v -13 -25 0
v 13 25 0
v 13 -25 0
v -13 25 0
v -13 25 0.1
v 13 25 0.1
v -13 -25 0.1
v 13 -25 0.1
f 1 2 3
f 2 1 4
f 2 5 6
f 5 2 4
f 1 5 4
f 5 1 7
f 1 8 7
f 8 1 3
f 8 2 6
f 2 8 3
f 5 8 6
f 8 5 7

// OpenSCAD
// file: ../p/4-4edge.scad
use <../lib.scad>
$fa=1; $fs=0.2;
function ldraw_lib__4_4edge(realsolid=false) = [
// 0 Circle 1.0
// 0 Name: 4-4edge.dat
// 0 Author: James Jessiman
// 0 !LDRAW_ORG Primitive UPDATE 2017-01
// 0 !LICENSE Licensed under CC BY 2.0 and CC BY 4.0 : see CAreadme.txt
// 
// 0 BFC CERTIFY CCW
  [0,"BFC","CERTIFY"],
  [0,"BFC","CCW"],
// 
// 0 !HISTORY 1998-12-15 [PTadmin] Official Update 1998-10
// 0 !HISTORY 2005-12-28 [PTadmin] Official Update 2005-01
// 0 !HISTORY 2007-06-24 [PTadmin] Header formatted for Contributor Agreement
// 0 !HISTORY 2008-07-01 [PTadmin] Official Update 2008-01
// 0 !HISTORY 2017-01-15 [Steffen] BFCed
// 0 !HISTORY 2017-12-30 [PTadmin] Official Update 2017-01
// 
// 
// 2 24 1 0 0 0.9239 0 0.3827
  [2,24,1,0,0,0.9239,0,0.3827],
// 2 24 0.9239 0 0.3827 0.7071 0 0.7071
  [2,24,0.9239,0,0.3827,0.7071,0,0.7071],
// 2 24 0.7071 0 0.7071 0.3827 0 0.9239
  [2,24,0.7071,0,0.7071,0.3827,0,0.9239],
// 2 24 0.3827 0 0.9239 0 0 1
  [2,24,0.3827,0,0.9239,0,0,1],
// 2 24 0 0 1 -0.3827 0 0.9239
  [2,24,0,0,1,-0.3827,0,0.9239],
// 2 24 -0.3827 0 0.9239 -0.7071 0 0.7071
  [2,24,-0.3827,0,0.9239,-0.7071,0,0.7071],
// 2 24 -0.7071 0 0.7071 -0.9239 0 0.3827
  [2,24,-0.7071,0,0.7071,-0.9239,0,0.3827],
// 2 24 -0.9239 0 0.3827 -1 0 -0
  [2,24,-0.9239,0,0.3827,-1,0,-0],
// 2 24 -1 0 -0 -0.9239 0 -0.3827
  [2,24,-1,0,-0,-0.9239,0,-0.3827],
// 2 24 -0.9239 0 -0.3827 -0.7071 0 -0.7071
  [2,24,-0.9239,0,-0.3827,-0.7071,0,-0.7071],
// 2 24 -0.7071 0 -0.7071 -0.3827 0 -0.9239
  [2,24,-0.7071,0,-0.7071,-0.3827,0,-0.9239],
// 2 24 -0.3827 0 -0.9239 0 0 -1
  [2,24,-0.3827,0,-0.9239,0,0,-1],
// 2 24 0 0 -1 0.3827 0 -0.9239
  [2,24,0,0,-1,0.3827,0,-0.9239],
// 2 24 0.3827 0 -0.9239 0.7071 0 -0.7071
  [2,24,0.3827,0,-0.9239,0.7071,0,-0.7071],
// 2 24 0.7071 0 -0.7071 0.9239 0 -0.3827
  [2,24,0.7071,0,-0.7071,0.9239,0,-0.3827],
// 2 24 0.9239 0 -0.3827 1 0 0
  [2,24,0.9239,0,-0.3827,1,0,0],
];
module ldraw_lib__4_4edge(step=0, col=false, unit=2/5, alt=false, line=0.2, solid=!$preview)
    makepoly(ldraw_lib__4_4edge(solid), step=step, col=col, unit=unit, alt=alt, line=line, solid=solid);
ldraw_lib__4_4edge(line=0.2);
// file: ../p/4-4disc.scad
use <../lib.scad>
$fa=1; $fs=0.2;
function ldraw_lib__4_4disc(realsolid=false) = [
// 0 Disc 1.0
// 0 Name: 4-4disc.dat
// 0 Author: James Jessiman
// 0 !LDRAW_ORG Primitive UPDATE 2002-02
// 0 !LICENSE Licensed under CC BY 2.0 and CC BY 4.0 : see CAreadme.txt
// 
// 0 BFC CERTIFY CCW
  [0,"BFC","CERTIFY"],
  [0,"BFC","CCW"],
// 
// 0 !HISTORY 1998-12-15 [PTadmin] Official Update 1998-10
// 0 !HISTORY 2002-03-23 [sbliss] Added BFC statement
// 0 !HISTORY 2002-04-25 [PTadmin] Official Update 2002-02
// 0 !HISTORY 2007-06-24 [PTadmin] Header formatted for Contributor Agreement
// 0 !HISTORY 2008-07-01 [PTadmin] Official Update 2008-01
// 
// 
// 3 16 0 0 0 1 0 0 0.9239 0 0.3827
  [3,16,0,0,0,1,0,0,0.9239,0,0.3827],
// 3 16 0 0 0 0.9239 0 0.3827 0.7071 0 0.7071
  [3,16,0,0,0,0.9239,0,0.3827,0.7071,0,0.7071],
// 3 16 0 0 0 0.7071 0 0.7071 0.3827 0 0.9239
  [3,16,0,0,0,0.7071,0,0.7071,0.3827,0,0.9239],
// 3 16 0 0 0 0.3827 0 0.9239 0 0 1
  [3,16,0,0,0,0.3827,0,0.9239,0,0,1],
// 3 16 0 0 0 0 0 1 -0.3827 0 0.9239
  [3,16,0,0,0,0,0,1,-0.3827,0,0.9239],
// 3 16 0 0 0 -0.3827 0 0.9239 -0.7071 0 0.7071
  [3,16,0,0,0,-0.3827,0,0.9239,-0.7071,0,0.7071],
// 3 16 0 0 0 -0.7071 0 0.7071 -0.9239 0 0.3827
  [3,16,0,0,0,-0.7071,0,0.7071,-0.9239,0,0.3827],
// 3 16 0 0 0 -0.9239 0 0.3827 -1 0 -0
  [3,16,0,0,0,-0.9239,0,0.3827,-1,0,-0],
// 3 16 0 0 0 -1 0 -0 -0.9239 0 -0.3827
  [3,16,0,0,0,-1,0,-0,-0.9239,0,-0.3827],
// 3 16 0 0 0 -0.9239 0 -0.3827 -0.7071 0 -0.7071
  [3,16,0,0,0,-0.9239,0,-0.3827,-0.7071,0,-0.7071],
// 3 16 0 0 0 -0.7071 0 -0.7071 -0.3827 0 -0.9239
  [3,16,0,0,0,-0.7071,0,-0.7071,-0.3827,0,-0.9239],
// 3 16 0 0 0 -0.3827 0 -0.9239 0 0 -1
  [3,16,0,0,0,-0.3827,0,-0.9239,0,0,-1],
// 3 16 0 0 0 0 0 -1 0.3827 0 -0.9239
  [3,16,0,0,0,0,0,-1,0.3827,0,-0.9239],
// 3 16 0 0 0 0.3827 0 -0.9239 0.7071 0 -0.7071
  [3,16,0,0,0,0.3827,0,-0.9239,0.7071,0,-0.7071],
// 3 16 0 0 0 0.7071 0 -0.7071 0.9239 0 -0.3827
  [3,16,0,0,0,0.7071,0,-0.7071,0.9239,0,-0.3827],
// 3 16 0 0 0 0.9239 0 -0.3827 1 0 0
  [3,16,0,0,0,0.9239,0,-0.3827,1,0,0],
// 0
];
module ldraw_lib__4_4disc(step=0, col=false, unit=2/5, alt=false, line=0.2, solid=!$preview)
    makepoly(ldraw_lib__4_4disc(solid), step=step, col=col, unit=unit, alt=alt, line=line, solid=solid);
ldraw_lib__4_4disc(line=0.2);
// file: ../p/4-4cyli.scad
use <../lib.scad>
$fa=1; $fs=0.2;
function ldraw_lib__4_4cyli(realsolid=false) = [
// 0 Cylinder 1.0
// 0 Name: 4-4cyli.dat
// 0 Author: James Jessiman
// 0 !LDRAW_ORG Primitive UPDATE 2005-01
// 0 !LICENSE Licensed under CC BY 2.0 and CC BY 4.0 : see CAreadme.txt
// 
// 0 BFC CERTIFY CCW
  [0,"BFC","CERTIFY"],
  [0,"BFC","CCW"],
// 
// 0 !HISTORY 1998-12-15 [PTadmin] Official Update 1998-10
// 0 !HISTORY 2002-03-23 [sbliss] Added BFC statement; merged headers from files in distributions LDraw 0.27 and Complete.
// 0 !HISTORY 2002-04-25 [PTadmin] Official Update 2002-02
// 0 !HISTORY 2004-12-14 [guyvivan] BFC CCW
// 0 !HISTORY 2005-12-28 [PTadmin] Official Update 2005-01
// 0 !HISTORY 2007-06-24 [PTadmin] Header formatted for Contributor Agreement
// 0 !HISTORY 2008-07-01 [PTadmin] Official Update 2008-01
// 
// 
// 4 16 1 1 0 0.9239 1 0.3827 0.9239 0 0.3827 1 0 0
  [4,16,1,1,0,0.9239,1,0.3827,0.9239,0,0.3827,1,0,0],
// 5 24 1 0 0 1 1 0 0.9239 0 0.3827 0.9239 0 -0.3827
  [5,24,1,0,0,1,1,0,0.9239,0,0.3827,0.9239,0,-0.3827],
// 4 16 0.9239 1 0.3827 0.7071 1 0.7071 0.7071 0 0.7071 0.9239 0 0.3827
  [4,16,0.9239,1,0.3827,0.7071,1,0.7071,0.7071,0,0.7071,0.9239,0,0.3827],
// 5 24 0.9239 0 0.3827 0.9239 1 0.3827 0.7071 0 0.7071 1 0 0
  [5,24,0.9239,0,0.3827,0.9239,1,0.3827,0.7071,0,0.7071,1,0,0],
// 4 16 0.7071 1 0.7071 0.3827 1 0.9239 0.3827 0 0.9239 0.7071 0 0.7071
  [4,16,0.7071,1,0.7071,0.3827,1,0.9239,0.3827,0,0.9239,0.7071,0,0.7071],
// 5 24 0.7071 0 0.7071 0.7071 1 0.7071 0.3827 0 0.9239 0.9239 0 0.3827
  [5,24,0.7071,0,0.7071,0.7071,1,0.7071,0.3827,0,0.9239,0.9239,0,0.3827],
// 4 16 0.3827 1 0.9239 0 1 1 0 0 1 0.3827 0 0.9239
  [4,16,0.3827,1,0.9239,0,1,1,0,0,1,0.3827,0,0.9239],
// 5 24 0.3827 0 0.9239 0.3827 1 0.9239 0 0 1 0.7071 0 0.7071
  [5,24,0.3827,0,0.9239,0.3827,1,0.9239,0,0,1,0.7071,0,0.7071],
// 4 16 0 1 1 -0.3827 1 0.9239 -0.3827 0 0.9239 0 0 1
  [4,16,0,1,1,-0.3827,1,0.9239,-0.3827,0,0.9239,0,0,1],
// 5 24 0 0 1 0 1 1 -0.3827 0 0.9239 0.3827 0 0.9239
  [5,24,0,0,1,0,1,1,-0.3827,0,0.9239,0.3827,0,0.9239],
// 4 16 -0.3827 1 0.9239 -0.7071 1 0.7071 -0.7071 0 0.7071 -0.3827 0 0.9239
  [4,16,-0.3827,1,0.9239,-0.7071,1,0.7071,-0.7071,0,0.7071,-0.3827,0,0.9239],
// 5 24 -0.3827 0 0.9239 -0.3827 1 0.9239 -0.7071 0 0.7071 0 0 1
  [5,24,-0.3827,0,0.9239,-0.3827,1,0.9239,-0.7071,0,0.7071,0,0,1],
// 4 16 -0.7071 1 0.7071 -0.9239 1 0.3827 -0.9239 0 0.3827 -0.7071 0 0.7071
  [4,16,-0.7071,1,0.7071,-0.9239,1,0.3827,-0.9239,0,0.3827,-0.7071,0,0.7071],
// 5 24 -0.7071 0 0.7071 -0.7071 1 0.7071 -0.9239 0 0.3827 -0.3827 0 0.9239
  [5,24,-0.7071,0,0.7071,-0.7071,1,0.7071,-0.9239,0,0.3827,-0.3827,0,0.9239],
// 4 16 -0.9239 1 0.3827 -1 1 0 -1 0 0 -0.9239 0 0.3827
  [4,16,-0.9239,1,0.3827,-1,1,0,-1,0,0,-0.9239,0,0.3827],
// 5 24 -0.9239 0 0.3827 -0.9239 1 0.3827 -1 0 0 -0.7071 0 0.7071
  [5,24,-0.9239,0,0.3827,-0.9239,1,0.3827,-1,0,0,-0.7071,0,0.7071],
// 4 16 -1 1 0 -0.9239 1 -0.3827 -0.9239 0 -0.3827 -1 0 0
  [4,16,-1,1,0,-0.9239,1,-0.3827,-0.9239,0,-0.3827,-1,0,0],
// 5 24 -1 0 0 -1 1 0 -0.9239 0 -0.3827 -0.9239 0 0.3827
  [5,24,-1,0,0,-1,1,0,-0.9239,0,-0.3827,-0.9239,0,0.3827],
// 4 16 -0.9239 1 -0.3827 -0.7071 1 -0.7071 -0.7071 0 -0.7071 -0.9239 0 -0.3827
  [4,16,-0.9239,1,-0.3827,-0.7071,1,-0.7071,-0.7071,0,-0.7071,-0.9239,0,-0.3827],
// 5 24 -0.9239 0 -0.3827 -0.9239 1 -0.3827 -0.7071 0 -0.7071 -1 0 0
  [5,24,-0.9239,0,-0.3827,-0.9239,1,-0.3827,-0.7071,0,-0.7071,-1,0,0],
// 4 16 -0.7071 1 -0.7071 -0.3827 1 -0.9239 -0.3827 0 -0.9239 -0.7071 0 -0.7071
  [4,16,-0.7071,1,-0.7071,-0.3827,1,-0.9239,-0.3827,0,-0.9239,-0.7071,0,-0.7071],
// 5 24 -0.7071 0 -0.7071 -0.7071 1 -0.7071 -0.3827 0 -0.9239 -0.9239 0 -0.3827
  [5,24,-0.7071,0,-0.7071,-0.7071,1,-0.7071,-0.3827,0,-0.9239,-0.9239,0,-0.3827],
// 4 16 -0.3827 1 -0.9239 0 1 -1 0 0 -1 -0.3827 0 -0.9239
  [4,16,-0.3827,1,-0.9239,0,1,-1,0,0,-1,-0.3827,0,-0.9239],
// 5 24 -0.3827 0 -0.9239 -0.3827 1 -0.9239 0 0 -1 -0.7071 0 -0.7071
  [5,24,-0.3827,0,-0.9239,-0.3827,1,-0.9239,0,0,-1,-0.7071,0,-0.7071],
// 4 16 0 1 -1 0.3827 1 -0.9239 0.3827 0 -0.9239 0 0 -1
  [4,16,0,1,-1,0.3827,1,-0.9239,0.3827,0,-0.9239,0,0,-1],
// 5 24 0 0 -1 0 1 -1 0.3827 0 -0.9239 -0.3827 0 -0.9239
  [5,24,0,0,-1,0,1,-1,0.3827,0,-0.9239,-0.3827,0,-0.9239],
// 4 16 0.3827 1 -0.9239 0.7071 1 -0.7071 0.7071 0 -0.7071 0.3827 0 -0.9239
  [4,16,0.3827,1,-0.9239,0.7071,1,-0.7071,0.7071,0,-0.7071,0.3827,0,-0.9239],
// 5 24 0.3827 0 -0.9239 0.3827 1 -0.9239 0.7071 0 -0.7071 0 0 -1
  [5,24,0.3827,0,-0.9239,0.3827,1,-0.9239,0.7071,0,-0.7071,0,0,-1],
// 4 16 0.7071 1 -0.7071 0.9239 1 -0.3827 0.9239 0 -0.3827 0.7071 0 -0.7071
  [4,16,0.7071,1,-0.7071,0.9239,1,-0.3827,0.9239,0,-0.3827,0.7071,0,-0.7071],
// 5 24 0.7071 0 -0.7071 0.7071 1 -0.7071 0.9239 0 -0.3827 0.3827 0 -0.9239
  [5,24,0.7071,0,-0.7071,0.7071,1,-0.7071,0.9239,0,-0.3827,0.3827,0,-0.9239],
// 4 16 0.9239 1 -0.3827 1 1 0 1 0 0 0.9239 0 -0.3827
  [4,16,0.9239,1,-0.3827,1,1,0,1,0,0,0.9239,0,-0.3827],
// 5 24 0.9239 0 -0.3827 0.9239 1 -0.3827 1 0 0 0.7071 0 -0.7071
  [5,24,0.9239,0,-0.3827,0.9239,1,-0.3827,1,0,0,0.7071,0,-0.7071],
// 0
];
module ldraw_lib__4_4cyli(step=0, col=false, unit=2/5, alt=false, line=0.2, solid=!$preview)
    makepoly(ldraw_lib__4_4cyli(solid), step=step, col=col, unit=unit, alt=alt, line=line, solid=solid);
ldraw_lib__4_4cyli(line=0.2);
// file: ../p/stud3.scad
use <../lib.scad>
use <4-4cyli.scad>
use <4-4disc.scad>
use <4-4edge.scad>
$fa=1; $fs=0.2;
function ldraw_lib__stud3(realsolid=false) = realsolid ? 
    [openscad(translate([0,0,-eps()], o=cylinder(4+eps(), r=4)),2)] : [
// 0 Stud Tube Solid
// 0 Name: stud3.dat
// 0 Author: James Jessiman
// 0 !LDRAW_ORG Primitive UPDATE 2012-01
// 0 !LICENSE Licensed under CC BY 2.0 and CC BY 4.0 : see CAreadme.txt
// 
// 0 BFC CERTIFY CCW
  [0,"BFC","CERTIFY"],
  [0,"BFC","CCW"],
// 
// 0 !HISTORY 2002-04-04 [sbliss] Modified for BFC compliance
// 0 !HISTORY 2002-04-25 [PTadmin] Official Update 2002-02
// 0 !HISTORY 2007-06-24 [PTadmin] Header formatted for Contributor Agreement
// 0 !HISTORY 2008-07-01 [PTadmin] Official Update 2008-01
// 0 !HISTORY 2012-02-16 [Philo] Changed to CCW
// 0 !HISTORY 2012-03-30 [PTadmin] Official Update 2012-01
// 
// 
// 1 16 0 -4 0 4 0 0 0 1 0 0 0 4 4-4edge.dat
  [1,16,0,-4,0,4,0,0,0,1,0,0,0,4, ldraw_lib__4_4edge(realsolid)],
// 1 16 0 0 0 4 0 0 0 1 0 0 0 4 4-4edge.dat
  [1,16,0,0,0,4,0,0,0,1,0,0,0,4, ldraw_lib__4_4edge(realsolid)],
// 1 16 0 -4 0 4 0 0 0 1 0 0 0 4 4-4disc.dat
  [1,16,0,-4,0,4,0,0,0,1,0,0,0,4, ldraw_lib__4_4disc(realsolid)],
// 1 16 0 -4 0 4 0 0 0 4 0 0 0 4 4-4cyli.dat
  [1,16,0,-4,0,4,0,0,0,4,0,0,0,4, ldraw_lib__4_4cyli(realsolid)],
];
module ldraw_lib__stud3(step=0, col=false, unit=2/5, alt=false, line=0.2, solid=!$preview)
    makepoly(ldraw_lib__stud3(solid), step=step, col=col, unit=unit, alt=alt, line=line, solid=solid);
ldraw_lib__stud3(line=0.2);
// file: ../p/stud.scad
use <../lib.scad>
use <4-4cyli.scad>
use <4-4disc.scad>
use <4-4edge.scad>
$fa=1; $fs=0.2;
function ldraw_lib__stud(realsolid=false) = realsolid ? 
    [openscad(translate([0,0,-eps()], o=cylinder(4+eps(), r=6)),2)] : [
// 0 Stud
// 0 Name: stud.dat
// 0 Author: James Jessiman
// 0 !LDRAW_ORG Primitive UPDATE 2012-01
// 0 !LICENSE Licensed under CC BY 2.0 and CC BY 4.0 : see CAreadme.txt
// 
// 0 BFC CERTIFY CCW
  [0,"BFC","CERTIFY"],
  [0,"BFC","CCW"],
// 
// 0 !HISTORY 2002-04-04 [sbliss] Modified for BFC compliance
// 0 !HISTORY 2002-04-25 [PTadmin] Official Update 2002-02
// 0 !HISTORY 2007-06-24 [PTadmin] Header formatted for Contributor Agreement
// 0 !HISTORY 2008-07-01 [PTadmin] Official Update 2008-01
// 0 !HISTORY 2012-02-16 [Philo] Changed to CCW
// 0 !HISTORY 2012-03-30 [PTadmin] Official Update 2012-01
// 
// 
// 1 16 0 0 0 6 0 0 0 1 0 0 0 6 4-4edge.dat
  [1,16,0,0,0,6,0,0,0,1,0,0,0,6, ldraw_lib__4_4edge(realsolid)],
// 1 16 0 -4 0 6 0 0 0 1 0 0 0 6 4-4edge.dat
  [1,16,0,-4,0,6,0,0,0,1,0,0,0,6, ldraw_lib__4_4edge(realsolid)],
// 1 16 0 0 0 6 0 0 0 -4 0 0 0 6 4-4cyli.dat
  [1,16,0,0,0,6,0,0,0,-4,0,0,0,6, ldraw_lib__4_4cyli(realsolid)],
// 1 16 0 -4 0 6 0 0 0 1 0 0 0 6 4-4disc.dat
  [1,16,0,-4,0,6,0,0,0,1,0,0,0,6, ldraw_lib__4_4disc(realsolid)],
];
module ldraw_lib__stud(step=0, col=false, unit=2/5, alt=false, line=0.2, solid=!$preview)
    makepoly(ldraw_lib__stud(solid), step=step, col=col, unit=unit, alt=alt, line=line, solid=solid);
ldraw_lib__stud(line=0.2);
// file: ../p/box5.scad
use <../lib.scad>
$fa=1; $fs=0.2;
function ldraw_lib__box5(realsolid=false) = [
// 0 Box with 5 Faces and All Edges
// 0 Name: box5.dat
// 0 Author: James Jessiman
// 0 !LDRAW_ORG Primitive UPDATE 2012-01
// 0 !LICENSE Licensed under CC BY 2.0 and CC BY 4.0 : see CAreadme.txt
// 
// 0 BFC CERTIFY CCW
  [0,"BFC","CERTIFY"],
  [0,"BFC","CCW"],
// 
// 0 !HISTORY 2002-04-03 [sbliss] Modified for BFC compliance
// 0 !HISTORY 2002-04-25 [PTadmin] Official Update 2002-02
// 0 !HISTORY 2007-06-24 [PTadmin] Header formatted for Contributor Agreement
// 0 !HISTORY 2008-07-01 [PTadmin] Official Update 2008-01
// 0 !HISTORY 2012-02-16 [Philo] Changed to CCW
// 0 !HISTORY 2012-03-30 [PTadmin] Official Update 2012-01
// 
// 
// 2 24 1 1 1 -1 1 1
  [2,24,1,1,1,-1,1,1],
// 2 24 -1 1 1 -1 1 -1
  [2,24,-1,1,1,-1,1,-1],
// 2 24 -1 1 -1 1 1 -1
  [2,24,-1,1,-1,1,1,-1],
// 2 24 1 1 -1 1 1 1
  [2,24,1,1,-1,1,1,1],
// 2 24 1 0 1 -1 0 1
  [2,24,1,0,1,-1,0,1],
// 2 24 -1 0 1 -1 0 -1
  [2,24,-1,0,1,-1,0,-1],
// 2 24 -1 0 -1 1 0 -1
  [2,24,-1,0,-1,1,0,-1],
// 2 24 1 0 -1 1 0 1
  [2,24,1,0,-1,1,0,1],
// 2 24 1 0 1 1 1 1
  [2,24,1,0,1,1,1,1],
// 2 24 -1 0 1 -1 1 1
  [2,24,-1,0,1,-1,1,1],
// 2 24 1 0 -1 1 1 -1
  [2,24,1,0,-1,1,1,-1],
// 2 24 -1 0 -1 -1 1 -1
  [2,24,-1,0,-1,-1,1,-1],
// 4 16 -1 1 1 1 1 1 1 1 -1 -1 1 -1
  [4,16,-1,1,1,1,1,1,1,1,-1,-1,1,-1],
// 4 16 -1 1 1 -1 0 1 1 0 1 1 1 1
  [4,16,-1,1,1,-1,0,1,1,0,1,1,1,1],
// 4 16 -1 1 -1 -1 0 -1 -1 0 1 -1 1 1
  [4,16,-1,1,-1,-1,0,-1,-1,0,1,-1,1,1],
// 4 16 1 1 -1 1 0 -1 -1 0 -1 -1 1 -1
  [4,16,1,1,-1,1,0,-1,-1,0,-1,-1,1,-1],
// 4 16 1 1 1 1 0 1 1 0 -1 1 1 -1
  [4,16,1,1,1,1,0,1,1,0,-1,1,1,-1],
];
module ldraw_lib__box5(step=0, col=false, unit=2/5, alt=false, line=0.2, solid=!$preview)
    makepoly(ldraw_lib__box5(solid), step=step, col=col, unit=unit, alt=alt, line=line, solid=solid);
ldraw_lib__box5(line=0.2);
// file: ../p/box4t.scad
use <../lib.scad>
$fa=1; $fs=0.2;
function ldraw_lib__box4t(realsolid=false) = [
// 0 Box with 4 Adjacent Faces and All Edges
// 0 Name: box4t.dat
// 0 Author: Tore Eriksson [Tore_Eriksson]
// 0 !LDRAW_ORG Primitive UPDATE 2003-02
// 0 !LICENSE Licensed under CC BY 2.0 and CC BY 4.0 : see CAreadme.txt
// 
// 0 BFC CERTIFY CCW
  [0,"BFC","CERTIFY"],
  [0,"BFC","CCW"],
// 
// 0 !HISTORY 1997-09-29 [PTadmin] Official Update 1997-15
// 0 !HISTORY 2002-08-31 [izanette] Modified with WINDZ for BFC compliance
// 0 !HISTORY 2003-08-01 [PTadmin] Official Update 2003-02
// 0 !HISTORY 2007-06-24 [PTadmin] Header formatted for Contributor Agreement
// 0 !HISTORY 2008-07-01 [PTadmin] Official Update 2008-01
// 
// 
// 2 24 1 1 1 -1 1 1
  [2,24,1,1,1,-1,1,1],
// 2 24 -1 1 1 -1 1 -1
  [2,24,-1,1,1,-1,1,-1],
// 2 24 -1 1 -1 1 1 -1
  [2,24,-1,1,-1,1,1,-1],
// 2 24 1 1 -1 1 1 1
  [2,24,1,1,-1,1,1,1],
// 2 24 1 0 1 -1 0 1
  [2,24,1,0,1,-1,0,1],
// 2 24 -1 0 1 -1 0 -1
  [2,24,-1,0,1,-1,0,-1],
// 2 24 -1 0 -1 1 0 -1
  [2,24,-1,0,-1,1,0,-1],
// 2 24 1 0 -1 1 0 1
  [2,24,1,0,-1,1,0,1],
// 2 24 1 0 1 1 1 1
  [2,24,1,0,1,1,1,1],
// 2 24 -1 0 1 -1 1 1
  [2,24,-1,0,1,-1,1,1],
// 2 24 1 0 -1 1 1 -1
  [2,24,1,0,-1,1,1,-1],
// 2 24 -1 0 -1 -1 1 -1
  [2,24,-1,0,-1,-1,1,-1],
// 4 16 1 1 1 1 1 -1 -1 1 -1 -1 1 1
  [4,16,1,1,1,1,1,-1,-1,1,-1,-1,1,1],
// 4 16 1 1 1 -1 1 1 -1 0 1 1 0 1
  [4,16,1,1,1,-1,1,1,-1,0,1,1,0,1],
// 4 16 -1 1 1 -1 1 -1 -1 0 -1 -1 0 1
  [4,16,-1,1,1,-1,1,-1,-1,0,-1,-1,0,1],
// 0 4 16 -1 1 -1 -1 0 -1 1 0 -1 1 1 -1
// 4 16 1 1 -1 1 1 1 1 0 1 1 0 -1
  [4,16,1,1,-1,1,1,1,1,0,1,1,0,-1],
// 0
];
module ldraw_lib__box4t(step=0, col=false, unit=2/5, alt=false, line=0.2, solid=!$preview)
    makepoly(ldraw_lib__box4t(solid), step=step, col=col, unit=unit, alt=alt, line=line, solid=solid);
ldraw_lib__box4t(line=0.2);
// file: s/3004s01.scad
use <../../lib.scad>
use <../../p/box4t.scad>
use <../../p/box5.scad>
use <../../p/stud.scad>
use <../../p/stud3.scad>
$fa=1; $fs=0.2;
function ldraw_lib__s__3004s01(realsolid=false) = [
// 0 ~Brick  1 x  2 without Front Face
// 0 Name: s\3004s01.dat
// 0 Author: James Jessiman
// 0 !LDRAW_ORG Subpart UPDATE 2003-03
// 0 !LICENSE Licensed under CC BY 2.0 and CC BY 4.0 : see CAreadme.txt
// 
// 0 BFC CERTIFY CCW
  [0,"BFC","CERTIFY"],
  [0,"BFC","CCW"],
// 
// 0 !HISTORY 2003-09-07 [jriley] Subfiling, BFC
// 0 !HISTORY 2003-12-19 [PTadmin] Official Update 2003-03
// 0 !HISTORY 2007-08-29 [PTadmin] Header formatted for Contributor Agreement
// 0 !HISTORY 2008-07-01 [PTadmin] Official Update 2008-01
// 
// 
// 1 16 0 4 0 1 0 0 0 -5 0 0 0 1 stud3.dat
  [1,16,0,4,0,1,0,0,0,-5,0,0,0,1, ldraw_lib__stud3(realsolid)],
// 0 BFC INVERTNEXT
  [0,"BFC","INVERTNEXT"],
// 1 16 0 24 0 16 0 0 0 -20 0 0 0 6 box5.dat
  [1,16,0,24,0,16,0,0,0,-20,0,0,0,6, ldraw_lib__box5(realsolid)],
// 4 16 20 24 10 16 24 6 -16 24 6 -20 24 10
  [4,16,20,24,10,16,24,6,-16,24,6,-20,24,10],
// 4 16 -20 24 10 -16 24 6 -16 24 -6 -20 24 -10
  [4,16,-20,24,10,-16,24,6,-16,24,-6,-20,24,-10],
// 4 16 -20 24 -10 -16 24 -6 16 24 -6 20 24 -10
  [4,16,-20,24,-10,-16,24,-6,16,24,-6,20,24,-10],
// 4 16 20 24 -10 16 24 -6 16 24 6 20 24 10
  [4,16,20,24,-10,16,24,-6,16,24,6,20,24,10],
// 1 16 0 24 0 20 0 0 0 -24 0 0 0 10 box4t.dat
  [1,16,0,24,0,20,0,0,0,-24,0,0,0,10, ldraw_lib__box4t(realsolid)],
// 1 16 10 0 0 1 0 0 0 1 0 0 0 1 stud.dat
  [1,16,10,0,0,1,0,0,0,1,0,0,0,1, ldraw_lib__stud(realsolid)],
// 1 16 -10 0 0 1 0 0 0 1 0 0 0 1 stud.dat
  [1,16,-10,0,0,1,0,0,0,1,0,0,0,1, ldraw_lib__stud(realsolid)],
// 0
];
module ldraw_lib__s__3004s01(step=0, col=false, unit=2/5, alt=false, line=0.2, solid=!$preview)
    makepoly(ldraw_lib__s__3004s01(solid), step=step, col=col, unit=unit, alt=alt, line=line, solid=solid);
ldraw_lib__s__3004s01(line=0.2);
// file: 3004.scad
use <../lib.scad>
use <s/3004s01.scad>
$fa=1; $fs=0.2;
function ldraw_lib__3004(realsolid=false) = [
// 0 Brick  1 x  2
// 0 Name: 3004.dat
// 0 Author: James Jessiman
// 0 !LDRAW_ORG Part UPDATE 2022-05
// 0 !LICENSE Licensed under CC BY 2.0 and CC BY 4.0 : see CAreadme.txt
// 
// 0 BFC CERTIFY CCW
  [0,"BFC","CERTIFY"],
  [0,"BFC","CCW"],
// 
// 0 !HISTORY 2001-10-26 [PTadmin] Official Update 2001-01
// 0 !HISTORY 2002-05-07 {unknown} BFC Certification
// 0 !HISTORY 2002-06-11 [PTadmin] Official Update 2002-03
// 0 !HISTORY 2007-05-07 [PTadmin] Header formatted for Contributor Agreement
// 0 !HISTORY 2008-07-01 [PTadmin] Official Update 2008-01
// 0 !HISTORY 2022-08-04 [MagFors] Using subfile
// 0 !HISTORY 2022-09-15 [PTadmin] Official Update 2022-05
// 
// 
// 1 16 0 0 0 1 0 0 0 1 0 0 0 1 s\3004s01.dat
  [1,16,0,0,0,1,0,0,0,1,0,0,0,1, ldraw_lib__s__3004s01(realsolid)],
// 4 16 -20 24 -10 20 24 -10 20 0 -10 -20 0 -10
  [4,16,-20,24,-10,20,24,-10,20,0,-10,-20,0,-10],
];
module ldraw_lib__3004(step=0, col=false, unit=2/5, alt=false, line=0.2, solid=!$preview)
    makepoly(ldraw_lib__3004(solid), step=step, col=col, unit=unit, alt=alt, line=line, solid=solid);
ldraw_lib__3004(line=0.2);
// file: ../p/box5-12.scad
use <../lib.scad>
$fa=1; $fs=0.2;
function ldraw_lib__box5_12(realsolid=false) = [
// 0 Box with 5 Faces without Any Edges
// 0 Name: box5-12.dat
// 0 Author: Chris Dee [cwdee]
// 0 !LDRAW_ORG Primitive UPDATE 2009-02
// 0 !LICENSE Licensed under CC BY 2.0 and CC BY 4.0 : see CAreadme.txt
// 
// 0 BFC CERTIFY CCW
  [0,"BFC","CERTIFY"],
  [0,"BFC","CCW"],
// 
// 0 !HISTORY 2009-09-03 [PTadmin] Official Update 2009-02
// 
// 
// 4 16 1 1 1 1 1 -1 -1 1 -1 -1 1 1
  [4,16,1,1,1,1,1,-1,-1,1,-1,-1,1,1],
// 4 16 -1 0 1 1 0 1 1 1 1 -1 1 1
  [4,16,-1,0,1,1,0,1,1,1,1,-1,1,1],
// 4 16 -1 0 -1 -1 0 1 -1 1 1 -1 1 -1
  [4,16,-1,0,-1,-1,0,1,-1,1,1,-1,1,-1],
// 4 16 1 0 -1 -1 0 -1 -1 1 -1 1 1 -1
  [4,16,1,0,-1,-1,0,-1,-1,1,-1,1,1,-1],
// 4 16 1 0 1 1 0 -1 1 1 -1 1 1 1
  [4,16,1,0,1,1,0,-1,1,1,-1,1,1,1],
// 0
];
module ldraw_lib__box5_12(step=0, col=false, unit=2/5, alt=false, line=0.2, solid=!$preview)
    makepoly(ldraw_lib__box5_12(solid), step=step, col=col, unit=unit, alt=alt, line=line, solid=solid);
ldraw_lib__box5_12(line=0.2);
// main file
use <../lib.scad>
use <../p/box5-12.scad>
$fa=1; $fs=0.2;
function ldraw_lib__6022692c(realsolid=false) = [
// 0 Sticker  6.3 x  3.3 with Brick Separator Movie Poster
// 0 Name: 6022692c.dat
// 0 Author: Orion Pobursky [OrionP]
// 0 !LDRAW_ORG Part UPDATE 2022-02
// 0 !LICENSE Licensed under CC BY 2.0 and CC BY 4.0 : see CAreadme.txt
// 
// 0 BFC CERTIFY CCW
  [0,"BFC","CERTIFY"],
  [0,"BFC","CCW"],
// 
// 0 !KEYWORDS set 10232
// 
// 0 !HISTORY 2022-03-06 [PTadmin] Official Update 2022-02
// 
// 
// 1 16 0 -0.25 0 32.5 0 0 0 0.25 0 0 0 62.5 box5-12.dat
  [1,16,0,-0.25,0,32.5,0,0,0,0.25,0,0,0,62.5, ldraw_lib__box5_12(realsolid)],
// 
// 0 !TEXMAP START PLANAR -32.5 -0.25 62.5 32.5 -0.25 62.5 -32.5 -0.25 -62.5 6022692c.png
// 0 !: 4 15 -32.5 -0.25 62.5 -32.5 -0.25 -62.5 32.5 -0.25 -62.5 32.5 -0.25 62.5
// 0 !TEXMAP FALLBACK
// 4 15 -32.5 -0.25 62.5 -32.5 -0.25 -62.5 32.5 -0.25 -62.5 32.5 -0.25 62.5
  [4,15,-32.5,-0.25,62.5,-32.5,-0.25,-62.5,32.5,-0.25,-62.5,32.5,-0.25,62.5],
// 0 !TEXMAP END
];
module ldraw_lib__6022692c(step=0, col=false, unit=2/5, alt=false, line=0.2, solid=!$preview)
    makepoly(ldraw_lib__6022692c(solid), step=step, col=col, unit=unit, alt=alt, line=line, solid=solid);
ldraw_lib__6022692c(line=0.2);
